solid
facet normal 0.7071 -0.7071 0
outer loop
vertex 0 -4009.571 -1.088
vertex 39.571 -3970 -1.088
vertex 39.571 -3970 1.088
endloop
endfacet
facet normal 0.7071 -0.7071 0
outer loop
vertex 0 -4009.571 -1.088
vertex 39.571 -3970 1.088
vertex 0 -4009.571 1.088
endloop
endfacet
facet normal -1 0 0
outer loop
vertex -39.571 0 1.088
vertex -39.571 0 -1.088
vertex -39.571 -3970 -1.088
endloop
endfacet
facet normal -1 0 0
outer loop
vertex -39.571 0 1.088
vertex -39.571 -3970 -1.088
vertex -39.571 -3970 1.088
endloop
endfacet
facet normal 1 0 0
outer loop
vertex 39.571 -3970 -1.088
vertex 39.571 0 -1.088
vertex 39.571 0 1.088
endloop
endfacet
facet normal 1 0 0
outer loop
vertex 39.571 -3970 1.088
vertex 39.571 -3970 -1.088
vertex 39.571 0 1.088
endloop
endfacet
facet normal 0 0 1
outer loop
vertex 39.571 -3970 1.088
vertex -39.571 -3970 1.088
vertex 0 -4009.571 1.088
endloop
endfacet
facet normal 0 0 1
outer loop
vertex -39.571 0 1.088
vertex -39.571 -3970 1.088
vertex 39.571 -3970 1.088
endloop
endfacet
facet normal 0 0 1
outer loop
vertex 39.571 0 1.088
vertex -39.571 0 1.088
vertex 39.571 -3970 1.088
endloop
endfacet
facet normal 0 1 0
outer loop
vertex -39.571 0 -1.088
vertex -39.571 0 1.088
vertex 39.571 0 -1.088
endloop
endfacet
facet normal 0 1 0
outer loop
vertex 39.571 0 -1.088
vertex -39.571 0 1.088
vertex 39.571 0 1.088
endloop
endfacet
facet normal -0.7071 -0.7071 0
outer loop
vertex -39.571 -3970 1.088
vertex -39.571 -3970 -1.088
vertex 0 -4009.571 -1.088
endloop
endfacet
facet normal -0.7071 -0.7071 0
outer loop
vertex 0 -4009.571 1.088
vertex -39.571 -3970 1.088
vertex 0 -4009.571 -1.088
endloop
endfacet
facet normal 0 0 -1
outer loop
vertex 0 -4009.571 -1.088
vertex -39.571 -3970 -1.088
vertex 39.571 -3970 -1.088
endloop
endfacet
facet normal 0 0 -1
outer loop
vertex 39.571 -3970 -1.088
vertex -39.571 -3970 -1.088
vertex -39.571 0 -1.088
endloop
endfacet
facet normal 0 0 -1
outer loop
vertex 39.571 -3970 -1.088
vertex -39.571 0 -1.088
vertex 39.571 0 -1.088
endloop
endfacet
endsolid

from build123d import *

# Parameters (mm, degrees)
F0_W        = 79.1414380074
F0_H        = 2.1752845496
F1_DEPTH    = 4010
F2_T1_DEPTH = 207.9099235869


# Not quite as in the source:
# - a fillet or chamfer that OpenCascade refuses, or shapes differently, is made with other operations: its cross-section is extruded or revolved along the edge and cut away or added


with BuildPart() as f1:
    # F0 (on Front) → F1 (new body)
    with BuildSketch(Plane.XZ):
        Rectangle(F0_W, F0_H)
    extrude(amount=F1_DEPTH)

    # F2: chamfer of 40 on 2 edges, made by hand

    # F2_s2 → F2_t1 (cut)
    with BuildSketch(Plane.XY.offset(-103.9549617934)):
        Polygon((39.5707190037, -3970), (-0.4292809963, -4010), (39.5707190037, -4010), align=None)
        Polygon((-39.5707190037, -3970), (0.4292809963, -4010), (-39.5707190037, -4010), align=None)
    extrude(amount=F2_T1_DEPTH, mode=Mode.SUBTRACT)


solid = f1.part
